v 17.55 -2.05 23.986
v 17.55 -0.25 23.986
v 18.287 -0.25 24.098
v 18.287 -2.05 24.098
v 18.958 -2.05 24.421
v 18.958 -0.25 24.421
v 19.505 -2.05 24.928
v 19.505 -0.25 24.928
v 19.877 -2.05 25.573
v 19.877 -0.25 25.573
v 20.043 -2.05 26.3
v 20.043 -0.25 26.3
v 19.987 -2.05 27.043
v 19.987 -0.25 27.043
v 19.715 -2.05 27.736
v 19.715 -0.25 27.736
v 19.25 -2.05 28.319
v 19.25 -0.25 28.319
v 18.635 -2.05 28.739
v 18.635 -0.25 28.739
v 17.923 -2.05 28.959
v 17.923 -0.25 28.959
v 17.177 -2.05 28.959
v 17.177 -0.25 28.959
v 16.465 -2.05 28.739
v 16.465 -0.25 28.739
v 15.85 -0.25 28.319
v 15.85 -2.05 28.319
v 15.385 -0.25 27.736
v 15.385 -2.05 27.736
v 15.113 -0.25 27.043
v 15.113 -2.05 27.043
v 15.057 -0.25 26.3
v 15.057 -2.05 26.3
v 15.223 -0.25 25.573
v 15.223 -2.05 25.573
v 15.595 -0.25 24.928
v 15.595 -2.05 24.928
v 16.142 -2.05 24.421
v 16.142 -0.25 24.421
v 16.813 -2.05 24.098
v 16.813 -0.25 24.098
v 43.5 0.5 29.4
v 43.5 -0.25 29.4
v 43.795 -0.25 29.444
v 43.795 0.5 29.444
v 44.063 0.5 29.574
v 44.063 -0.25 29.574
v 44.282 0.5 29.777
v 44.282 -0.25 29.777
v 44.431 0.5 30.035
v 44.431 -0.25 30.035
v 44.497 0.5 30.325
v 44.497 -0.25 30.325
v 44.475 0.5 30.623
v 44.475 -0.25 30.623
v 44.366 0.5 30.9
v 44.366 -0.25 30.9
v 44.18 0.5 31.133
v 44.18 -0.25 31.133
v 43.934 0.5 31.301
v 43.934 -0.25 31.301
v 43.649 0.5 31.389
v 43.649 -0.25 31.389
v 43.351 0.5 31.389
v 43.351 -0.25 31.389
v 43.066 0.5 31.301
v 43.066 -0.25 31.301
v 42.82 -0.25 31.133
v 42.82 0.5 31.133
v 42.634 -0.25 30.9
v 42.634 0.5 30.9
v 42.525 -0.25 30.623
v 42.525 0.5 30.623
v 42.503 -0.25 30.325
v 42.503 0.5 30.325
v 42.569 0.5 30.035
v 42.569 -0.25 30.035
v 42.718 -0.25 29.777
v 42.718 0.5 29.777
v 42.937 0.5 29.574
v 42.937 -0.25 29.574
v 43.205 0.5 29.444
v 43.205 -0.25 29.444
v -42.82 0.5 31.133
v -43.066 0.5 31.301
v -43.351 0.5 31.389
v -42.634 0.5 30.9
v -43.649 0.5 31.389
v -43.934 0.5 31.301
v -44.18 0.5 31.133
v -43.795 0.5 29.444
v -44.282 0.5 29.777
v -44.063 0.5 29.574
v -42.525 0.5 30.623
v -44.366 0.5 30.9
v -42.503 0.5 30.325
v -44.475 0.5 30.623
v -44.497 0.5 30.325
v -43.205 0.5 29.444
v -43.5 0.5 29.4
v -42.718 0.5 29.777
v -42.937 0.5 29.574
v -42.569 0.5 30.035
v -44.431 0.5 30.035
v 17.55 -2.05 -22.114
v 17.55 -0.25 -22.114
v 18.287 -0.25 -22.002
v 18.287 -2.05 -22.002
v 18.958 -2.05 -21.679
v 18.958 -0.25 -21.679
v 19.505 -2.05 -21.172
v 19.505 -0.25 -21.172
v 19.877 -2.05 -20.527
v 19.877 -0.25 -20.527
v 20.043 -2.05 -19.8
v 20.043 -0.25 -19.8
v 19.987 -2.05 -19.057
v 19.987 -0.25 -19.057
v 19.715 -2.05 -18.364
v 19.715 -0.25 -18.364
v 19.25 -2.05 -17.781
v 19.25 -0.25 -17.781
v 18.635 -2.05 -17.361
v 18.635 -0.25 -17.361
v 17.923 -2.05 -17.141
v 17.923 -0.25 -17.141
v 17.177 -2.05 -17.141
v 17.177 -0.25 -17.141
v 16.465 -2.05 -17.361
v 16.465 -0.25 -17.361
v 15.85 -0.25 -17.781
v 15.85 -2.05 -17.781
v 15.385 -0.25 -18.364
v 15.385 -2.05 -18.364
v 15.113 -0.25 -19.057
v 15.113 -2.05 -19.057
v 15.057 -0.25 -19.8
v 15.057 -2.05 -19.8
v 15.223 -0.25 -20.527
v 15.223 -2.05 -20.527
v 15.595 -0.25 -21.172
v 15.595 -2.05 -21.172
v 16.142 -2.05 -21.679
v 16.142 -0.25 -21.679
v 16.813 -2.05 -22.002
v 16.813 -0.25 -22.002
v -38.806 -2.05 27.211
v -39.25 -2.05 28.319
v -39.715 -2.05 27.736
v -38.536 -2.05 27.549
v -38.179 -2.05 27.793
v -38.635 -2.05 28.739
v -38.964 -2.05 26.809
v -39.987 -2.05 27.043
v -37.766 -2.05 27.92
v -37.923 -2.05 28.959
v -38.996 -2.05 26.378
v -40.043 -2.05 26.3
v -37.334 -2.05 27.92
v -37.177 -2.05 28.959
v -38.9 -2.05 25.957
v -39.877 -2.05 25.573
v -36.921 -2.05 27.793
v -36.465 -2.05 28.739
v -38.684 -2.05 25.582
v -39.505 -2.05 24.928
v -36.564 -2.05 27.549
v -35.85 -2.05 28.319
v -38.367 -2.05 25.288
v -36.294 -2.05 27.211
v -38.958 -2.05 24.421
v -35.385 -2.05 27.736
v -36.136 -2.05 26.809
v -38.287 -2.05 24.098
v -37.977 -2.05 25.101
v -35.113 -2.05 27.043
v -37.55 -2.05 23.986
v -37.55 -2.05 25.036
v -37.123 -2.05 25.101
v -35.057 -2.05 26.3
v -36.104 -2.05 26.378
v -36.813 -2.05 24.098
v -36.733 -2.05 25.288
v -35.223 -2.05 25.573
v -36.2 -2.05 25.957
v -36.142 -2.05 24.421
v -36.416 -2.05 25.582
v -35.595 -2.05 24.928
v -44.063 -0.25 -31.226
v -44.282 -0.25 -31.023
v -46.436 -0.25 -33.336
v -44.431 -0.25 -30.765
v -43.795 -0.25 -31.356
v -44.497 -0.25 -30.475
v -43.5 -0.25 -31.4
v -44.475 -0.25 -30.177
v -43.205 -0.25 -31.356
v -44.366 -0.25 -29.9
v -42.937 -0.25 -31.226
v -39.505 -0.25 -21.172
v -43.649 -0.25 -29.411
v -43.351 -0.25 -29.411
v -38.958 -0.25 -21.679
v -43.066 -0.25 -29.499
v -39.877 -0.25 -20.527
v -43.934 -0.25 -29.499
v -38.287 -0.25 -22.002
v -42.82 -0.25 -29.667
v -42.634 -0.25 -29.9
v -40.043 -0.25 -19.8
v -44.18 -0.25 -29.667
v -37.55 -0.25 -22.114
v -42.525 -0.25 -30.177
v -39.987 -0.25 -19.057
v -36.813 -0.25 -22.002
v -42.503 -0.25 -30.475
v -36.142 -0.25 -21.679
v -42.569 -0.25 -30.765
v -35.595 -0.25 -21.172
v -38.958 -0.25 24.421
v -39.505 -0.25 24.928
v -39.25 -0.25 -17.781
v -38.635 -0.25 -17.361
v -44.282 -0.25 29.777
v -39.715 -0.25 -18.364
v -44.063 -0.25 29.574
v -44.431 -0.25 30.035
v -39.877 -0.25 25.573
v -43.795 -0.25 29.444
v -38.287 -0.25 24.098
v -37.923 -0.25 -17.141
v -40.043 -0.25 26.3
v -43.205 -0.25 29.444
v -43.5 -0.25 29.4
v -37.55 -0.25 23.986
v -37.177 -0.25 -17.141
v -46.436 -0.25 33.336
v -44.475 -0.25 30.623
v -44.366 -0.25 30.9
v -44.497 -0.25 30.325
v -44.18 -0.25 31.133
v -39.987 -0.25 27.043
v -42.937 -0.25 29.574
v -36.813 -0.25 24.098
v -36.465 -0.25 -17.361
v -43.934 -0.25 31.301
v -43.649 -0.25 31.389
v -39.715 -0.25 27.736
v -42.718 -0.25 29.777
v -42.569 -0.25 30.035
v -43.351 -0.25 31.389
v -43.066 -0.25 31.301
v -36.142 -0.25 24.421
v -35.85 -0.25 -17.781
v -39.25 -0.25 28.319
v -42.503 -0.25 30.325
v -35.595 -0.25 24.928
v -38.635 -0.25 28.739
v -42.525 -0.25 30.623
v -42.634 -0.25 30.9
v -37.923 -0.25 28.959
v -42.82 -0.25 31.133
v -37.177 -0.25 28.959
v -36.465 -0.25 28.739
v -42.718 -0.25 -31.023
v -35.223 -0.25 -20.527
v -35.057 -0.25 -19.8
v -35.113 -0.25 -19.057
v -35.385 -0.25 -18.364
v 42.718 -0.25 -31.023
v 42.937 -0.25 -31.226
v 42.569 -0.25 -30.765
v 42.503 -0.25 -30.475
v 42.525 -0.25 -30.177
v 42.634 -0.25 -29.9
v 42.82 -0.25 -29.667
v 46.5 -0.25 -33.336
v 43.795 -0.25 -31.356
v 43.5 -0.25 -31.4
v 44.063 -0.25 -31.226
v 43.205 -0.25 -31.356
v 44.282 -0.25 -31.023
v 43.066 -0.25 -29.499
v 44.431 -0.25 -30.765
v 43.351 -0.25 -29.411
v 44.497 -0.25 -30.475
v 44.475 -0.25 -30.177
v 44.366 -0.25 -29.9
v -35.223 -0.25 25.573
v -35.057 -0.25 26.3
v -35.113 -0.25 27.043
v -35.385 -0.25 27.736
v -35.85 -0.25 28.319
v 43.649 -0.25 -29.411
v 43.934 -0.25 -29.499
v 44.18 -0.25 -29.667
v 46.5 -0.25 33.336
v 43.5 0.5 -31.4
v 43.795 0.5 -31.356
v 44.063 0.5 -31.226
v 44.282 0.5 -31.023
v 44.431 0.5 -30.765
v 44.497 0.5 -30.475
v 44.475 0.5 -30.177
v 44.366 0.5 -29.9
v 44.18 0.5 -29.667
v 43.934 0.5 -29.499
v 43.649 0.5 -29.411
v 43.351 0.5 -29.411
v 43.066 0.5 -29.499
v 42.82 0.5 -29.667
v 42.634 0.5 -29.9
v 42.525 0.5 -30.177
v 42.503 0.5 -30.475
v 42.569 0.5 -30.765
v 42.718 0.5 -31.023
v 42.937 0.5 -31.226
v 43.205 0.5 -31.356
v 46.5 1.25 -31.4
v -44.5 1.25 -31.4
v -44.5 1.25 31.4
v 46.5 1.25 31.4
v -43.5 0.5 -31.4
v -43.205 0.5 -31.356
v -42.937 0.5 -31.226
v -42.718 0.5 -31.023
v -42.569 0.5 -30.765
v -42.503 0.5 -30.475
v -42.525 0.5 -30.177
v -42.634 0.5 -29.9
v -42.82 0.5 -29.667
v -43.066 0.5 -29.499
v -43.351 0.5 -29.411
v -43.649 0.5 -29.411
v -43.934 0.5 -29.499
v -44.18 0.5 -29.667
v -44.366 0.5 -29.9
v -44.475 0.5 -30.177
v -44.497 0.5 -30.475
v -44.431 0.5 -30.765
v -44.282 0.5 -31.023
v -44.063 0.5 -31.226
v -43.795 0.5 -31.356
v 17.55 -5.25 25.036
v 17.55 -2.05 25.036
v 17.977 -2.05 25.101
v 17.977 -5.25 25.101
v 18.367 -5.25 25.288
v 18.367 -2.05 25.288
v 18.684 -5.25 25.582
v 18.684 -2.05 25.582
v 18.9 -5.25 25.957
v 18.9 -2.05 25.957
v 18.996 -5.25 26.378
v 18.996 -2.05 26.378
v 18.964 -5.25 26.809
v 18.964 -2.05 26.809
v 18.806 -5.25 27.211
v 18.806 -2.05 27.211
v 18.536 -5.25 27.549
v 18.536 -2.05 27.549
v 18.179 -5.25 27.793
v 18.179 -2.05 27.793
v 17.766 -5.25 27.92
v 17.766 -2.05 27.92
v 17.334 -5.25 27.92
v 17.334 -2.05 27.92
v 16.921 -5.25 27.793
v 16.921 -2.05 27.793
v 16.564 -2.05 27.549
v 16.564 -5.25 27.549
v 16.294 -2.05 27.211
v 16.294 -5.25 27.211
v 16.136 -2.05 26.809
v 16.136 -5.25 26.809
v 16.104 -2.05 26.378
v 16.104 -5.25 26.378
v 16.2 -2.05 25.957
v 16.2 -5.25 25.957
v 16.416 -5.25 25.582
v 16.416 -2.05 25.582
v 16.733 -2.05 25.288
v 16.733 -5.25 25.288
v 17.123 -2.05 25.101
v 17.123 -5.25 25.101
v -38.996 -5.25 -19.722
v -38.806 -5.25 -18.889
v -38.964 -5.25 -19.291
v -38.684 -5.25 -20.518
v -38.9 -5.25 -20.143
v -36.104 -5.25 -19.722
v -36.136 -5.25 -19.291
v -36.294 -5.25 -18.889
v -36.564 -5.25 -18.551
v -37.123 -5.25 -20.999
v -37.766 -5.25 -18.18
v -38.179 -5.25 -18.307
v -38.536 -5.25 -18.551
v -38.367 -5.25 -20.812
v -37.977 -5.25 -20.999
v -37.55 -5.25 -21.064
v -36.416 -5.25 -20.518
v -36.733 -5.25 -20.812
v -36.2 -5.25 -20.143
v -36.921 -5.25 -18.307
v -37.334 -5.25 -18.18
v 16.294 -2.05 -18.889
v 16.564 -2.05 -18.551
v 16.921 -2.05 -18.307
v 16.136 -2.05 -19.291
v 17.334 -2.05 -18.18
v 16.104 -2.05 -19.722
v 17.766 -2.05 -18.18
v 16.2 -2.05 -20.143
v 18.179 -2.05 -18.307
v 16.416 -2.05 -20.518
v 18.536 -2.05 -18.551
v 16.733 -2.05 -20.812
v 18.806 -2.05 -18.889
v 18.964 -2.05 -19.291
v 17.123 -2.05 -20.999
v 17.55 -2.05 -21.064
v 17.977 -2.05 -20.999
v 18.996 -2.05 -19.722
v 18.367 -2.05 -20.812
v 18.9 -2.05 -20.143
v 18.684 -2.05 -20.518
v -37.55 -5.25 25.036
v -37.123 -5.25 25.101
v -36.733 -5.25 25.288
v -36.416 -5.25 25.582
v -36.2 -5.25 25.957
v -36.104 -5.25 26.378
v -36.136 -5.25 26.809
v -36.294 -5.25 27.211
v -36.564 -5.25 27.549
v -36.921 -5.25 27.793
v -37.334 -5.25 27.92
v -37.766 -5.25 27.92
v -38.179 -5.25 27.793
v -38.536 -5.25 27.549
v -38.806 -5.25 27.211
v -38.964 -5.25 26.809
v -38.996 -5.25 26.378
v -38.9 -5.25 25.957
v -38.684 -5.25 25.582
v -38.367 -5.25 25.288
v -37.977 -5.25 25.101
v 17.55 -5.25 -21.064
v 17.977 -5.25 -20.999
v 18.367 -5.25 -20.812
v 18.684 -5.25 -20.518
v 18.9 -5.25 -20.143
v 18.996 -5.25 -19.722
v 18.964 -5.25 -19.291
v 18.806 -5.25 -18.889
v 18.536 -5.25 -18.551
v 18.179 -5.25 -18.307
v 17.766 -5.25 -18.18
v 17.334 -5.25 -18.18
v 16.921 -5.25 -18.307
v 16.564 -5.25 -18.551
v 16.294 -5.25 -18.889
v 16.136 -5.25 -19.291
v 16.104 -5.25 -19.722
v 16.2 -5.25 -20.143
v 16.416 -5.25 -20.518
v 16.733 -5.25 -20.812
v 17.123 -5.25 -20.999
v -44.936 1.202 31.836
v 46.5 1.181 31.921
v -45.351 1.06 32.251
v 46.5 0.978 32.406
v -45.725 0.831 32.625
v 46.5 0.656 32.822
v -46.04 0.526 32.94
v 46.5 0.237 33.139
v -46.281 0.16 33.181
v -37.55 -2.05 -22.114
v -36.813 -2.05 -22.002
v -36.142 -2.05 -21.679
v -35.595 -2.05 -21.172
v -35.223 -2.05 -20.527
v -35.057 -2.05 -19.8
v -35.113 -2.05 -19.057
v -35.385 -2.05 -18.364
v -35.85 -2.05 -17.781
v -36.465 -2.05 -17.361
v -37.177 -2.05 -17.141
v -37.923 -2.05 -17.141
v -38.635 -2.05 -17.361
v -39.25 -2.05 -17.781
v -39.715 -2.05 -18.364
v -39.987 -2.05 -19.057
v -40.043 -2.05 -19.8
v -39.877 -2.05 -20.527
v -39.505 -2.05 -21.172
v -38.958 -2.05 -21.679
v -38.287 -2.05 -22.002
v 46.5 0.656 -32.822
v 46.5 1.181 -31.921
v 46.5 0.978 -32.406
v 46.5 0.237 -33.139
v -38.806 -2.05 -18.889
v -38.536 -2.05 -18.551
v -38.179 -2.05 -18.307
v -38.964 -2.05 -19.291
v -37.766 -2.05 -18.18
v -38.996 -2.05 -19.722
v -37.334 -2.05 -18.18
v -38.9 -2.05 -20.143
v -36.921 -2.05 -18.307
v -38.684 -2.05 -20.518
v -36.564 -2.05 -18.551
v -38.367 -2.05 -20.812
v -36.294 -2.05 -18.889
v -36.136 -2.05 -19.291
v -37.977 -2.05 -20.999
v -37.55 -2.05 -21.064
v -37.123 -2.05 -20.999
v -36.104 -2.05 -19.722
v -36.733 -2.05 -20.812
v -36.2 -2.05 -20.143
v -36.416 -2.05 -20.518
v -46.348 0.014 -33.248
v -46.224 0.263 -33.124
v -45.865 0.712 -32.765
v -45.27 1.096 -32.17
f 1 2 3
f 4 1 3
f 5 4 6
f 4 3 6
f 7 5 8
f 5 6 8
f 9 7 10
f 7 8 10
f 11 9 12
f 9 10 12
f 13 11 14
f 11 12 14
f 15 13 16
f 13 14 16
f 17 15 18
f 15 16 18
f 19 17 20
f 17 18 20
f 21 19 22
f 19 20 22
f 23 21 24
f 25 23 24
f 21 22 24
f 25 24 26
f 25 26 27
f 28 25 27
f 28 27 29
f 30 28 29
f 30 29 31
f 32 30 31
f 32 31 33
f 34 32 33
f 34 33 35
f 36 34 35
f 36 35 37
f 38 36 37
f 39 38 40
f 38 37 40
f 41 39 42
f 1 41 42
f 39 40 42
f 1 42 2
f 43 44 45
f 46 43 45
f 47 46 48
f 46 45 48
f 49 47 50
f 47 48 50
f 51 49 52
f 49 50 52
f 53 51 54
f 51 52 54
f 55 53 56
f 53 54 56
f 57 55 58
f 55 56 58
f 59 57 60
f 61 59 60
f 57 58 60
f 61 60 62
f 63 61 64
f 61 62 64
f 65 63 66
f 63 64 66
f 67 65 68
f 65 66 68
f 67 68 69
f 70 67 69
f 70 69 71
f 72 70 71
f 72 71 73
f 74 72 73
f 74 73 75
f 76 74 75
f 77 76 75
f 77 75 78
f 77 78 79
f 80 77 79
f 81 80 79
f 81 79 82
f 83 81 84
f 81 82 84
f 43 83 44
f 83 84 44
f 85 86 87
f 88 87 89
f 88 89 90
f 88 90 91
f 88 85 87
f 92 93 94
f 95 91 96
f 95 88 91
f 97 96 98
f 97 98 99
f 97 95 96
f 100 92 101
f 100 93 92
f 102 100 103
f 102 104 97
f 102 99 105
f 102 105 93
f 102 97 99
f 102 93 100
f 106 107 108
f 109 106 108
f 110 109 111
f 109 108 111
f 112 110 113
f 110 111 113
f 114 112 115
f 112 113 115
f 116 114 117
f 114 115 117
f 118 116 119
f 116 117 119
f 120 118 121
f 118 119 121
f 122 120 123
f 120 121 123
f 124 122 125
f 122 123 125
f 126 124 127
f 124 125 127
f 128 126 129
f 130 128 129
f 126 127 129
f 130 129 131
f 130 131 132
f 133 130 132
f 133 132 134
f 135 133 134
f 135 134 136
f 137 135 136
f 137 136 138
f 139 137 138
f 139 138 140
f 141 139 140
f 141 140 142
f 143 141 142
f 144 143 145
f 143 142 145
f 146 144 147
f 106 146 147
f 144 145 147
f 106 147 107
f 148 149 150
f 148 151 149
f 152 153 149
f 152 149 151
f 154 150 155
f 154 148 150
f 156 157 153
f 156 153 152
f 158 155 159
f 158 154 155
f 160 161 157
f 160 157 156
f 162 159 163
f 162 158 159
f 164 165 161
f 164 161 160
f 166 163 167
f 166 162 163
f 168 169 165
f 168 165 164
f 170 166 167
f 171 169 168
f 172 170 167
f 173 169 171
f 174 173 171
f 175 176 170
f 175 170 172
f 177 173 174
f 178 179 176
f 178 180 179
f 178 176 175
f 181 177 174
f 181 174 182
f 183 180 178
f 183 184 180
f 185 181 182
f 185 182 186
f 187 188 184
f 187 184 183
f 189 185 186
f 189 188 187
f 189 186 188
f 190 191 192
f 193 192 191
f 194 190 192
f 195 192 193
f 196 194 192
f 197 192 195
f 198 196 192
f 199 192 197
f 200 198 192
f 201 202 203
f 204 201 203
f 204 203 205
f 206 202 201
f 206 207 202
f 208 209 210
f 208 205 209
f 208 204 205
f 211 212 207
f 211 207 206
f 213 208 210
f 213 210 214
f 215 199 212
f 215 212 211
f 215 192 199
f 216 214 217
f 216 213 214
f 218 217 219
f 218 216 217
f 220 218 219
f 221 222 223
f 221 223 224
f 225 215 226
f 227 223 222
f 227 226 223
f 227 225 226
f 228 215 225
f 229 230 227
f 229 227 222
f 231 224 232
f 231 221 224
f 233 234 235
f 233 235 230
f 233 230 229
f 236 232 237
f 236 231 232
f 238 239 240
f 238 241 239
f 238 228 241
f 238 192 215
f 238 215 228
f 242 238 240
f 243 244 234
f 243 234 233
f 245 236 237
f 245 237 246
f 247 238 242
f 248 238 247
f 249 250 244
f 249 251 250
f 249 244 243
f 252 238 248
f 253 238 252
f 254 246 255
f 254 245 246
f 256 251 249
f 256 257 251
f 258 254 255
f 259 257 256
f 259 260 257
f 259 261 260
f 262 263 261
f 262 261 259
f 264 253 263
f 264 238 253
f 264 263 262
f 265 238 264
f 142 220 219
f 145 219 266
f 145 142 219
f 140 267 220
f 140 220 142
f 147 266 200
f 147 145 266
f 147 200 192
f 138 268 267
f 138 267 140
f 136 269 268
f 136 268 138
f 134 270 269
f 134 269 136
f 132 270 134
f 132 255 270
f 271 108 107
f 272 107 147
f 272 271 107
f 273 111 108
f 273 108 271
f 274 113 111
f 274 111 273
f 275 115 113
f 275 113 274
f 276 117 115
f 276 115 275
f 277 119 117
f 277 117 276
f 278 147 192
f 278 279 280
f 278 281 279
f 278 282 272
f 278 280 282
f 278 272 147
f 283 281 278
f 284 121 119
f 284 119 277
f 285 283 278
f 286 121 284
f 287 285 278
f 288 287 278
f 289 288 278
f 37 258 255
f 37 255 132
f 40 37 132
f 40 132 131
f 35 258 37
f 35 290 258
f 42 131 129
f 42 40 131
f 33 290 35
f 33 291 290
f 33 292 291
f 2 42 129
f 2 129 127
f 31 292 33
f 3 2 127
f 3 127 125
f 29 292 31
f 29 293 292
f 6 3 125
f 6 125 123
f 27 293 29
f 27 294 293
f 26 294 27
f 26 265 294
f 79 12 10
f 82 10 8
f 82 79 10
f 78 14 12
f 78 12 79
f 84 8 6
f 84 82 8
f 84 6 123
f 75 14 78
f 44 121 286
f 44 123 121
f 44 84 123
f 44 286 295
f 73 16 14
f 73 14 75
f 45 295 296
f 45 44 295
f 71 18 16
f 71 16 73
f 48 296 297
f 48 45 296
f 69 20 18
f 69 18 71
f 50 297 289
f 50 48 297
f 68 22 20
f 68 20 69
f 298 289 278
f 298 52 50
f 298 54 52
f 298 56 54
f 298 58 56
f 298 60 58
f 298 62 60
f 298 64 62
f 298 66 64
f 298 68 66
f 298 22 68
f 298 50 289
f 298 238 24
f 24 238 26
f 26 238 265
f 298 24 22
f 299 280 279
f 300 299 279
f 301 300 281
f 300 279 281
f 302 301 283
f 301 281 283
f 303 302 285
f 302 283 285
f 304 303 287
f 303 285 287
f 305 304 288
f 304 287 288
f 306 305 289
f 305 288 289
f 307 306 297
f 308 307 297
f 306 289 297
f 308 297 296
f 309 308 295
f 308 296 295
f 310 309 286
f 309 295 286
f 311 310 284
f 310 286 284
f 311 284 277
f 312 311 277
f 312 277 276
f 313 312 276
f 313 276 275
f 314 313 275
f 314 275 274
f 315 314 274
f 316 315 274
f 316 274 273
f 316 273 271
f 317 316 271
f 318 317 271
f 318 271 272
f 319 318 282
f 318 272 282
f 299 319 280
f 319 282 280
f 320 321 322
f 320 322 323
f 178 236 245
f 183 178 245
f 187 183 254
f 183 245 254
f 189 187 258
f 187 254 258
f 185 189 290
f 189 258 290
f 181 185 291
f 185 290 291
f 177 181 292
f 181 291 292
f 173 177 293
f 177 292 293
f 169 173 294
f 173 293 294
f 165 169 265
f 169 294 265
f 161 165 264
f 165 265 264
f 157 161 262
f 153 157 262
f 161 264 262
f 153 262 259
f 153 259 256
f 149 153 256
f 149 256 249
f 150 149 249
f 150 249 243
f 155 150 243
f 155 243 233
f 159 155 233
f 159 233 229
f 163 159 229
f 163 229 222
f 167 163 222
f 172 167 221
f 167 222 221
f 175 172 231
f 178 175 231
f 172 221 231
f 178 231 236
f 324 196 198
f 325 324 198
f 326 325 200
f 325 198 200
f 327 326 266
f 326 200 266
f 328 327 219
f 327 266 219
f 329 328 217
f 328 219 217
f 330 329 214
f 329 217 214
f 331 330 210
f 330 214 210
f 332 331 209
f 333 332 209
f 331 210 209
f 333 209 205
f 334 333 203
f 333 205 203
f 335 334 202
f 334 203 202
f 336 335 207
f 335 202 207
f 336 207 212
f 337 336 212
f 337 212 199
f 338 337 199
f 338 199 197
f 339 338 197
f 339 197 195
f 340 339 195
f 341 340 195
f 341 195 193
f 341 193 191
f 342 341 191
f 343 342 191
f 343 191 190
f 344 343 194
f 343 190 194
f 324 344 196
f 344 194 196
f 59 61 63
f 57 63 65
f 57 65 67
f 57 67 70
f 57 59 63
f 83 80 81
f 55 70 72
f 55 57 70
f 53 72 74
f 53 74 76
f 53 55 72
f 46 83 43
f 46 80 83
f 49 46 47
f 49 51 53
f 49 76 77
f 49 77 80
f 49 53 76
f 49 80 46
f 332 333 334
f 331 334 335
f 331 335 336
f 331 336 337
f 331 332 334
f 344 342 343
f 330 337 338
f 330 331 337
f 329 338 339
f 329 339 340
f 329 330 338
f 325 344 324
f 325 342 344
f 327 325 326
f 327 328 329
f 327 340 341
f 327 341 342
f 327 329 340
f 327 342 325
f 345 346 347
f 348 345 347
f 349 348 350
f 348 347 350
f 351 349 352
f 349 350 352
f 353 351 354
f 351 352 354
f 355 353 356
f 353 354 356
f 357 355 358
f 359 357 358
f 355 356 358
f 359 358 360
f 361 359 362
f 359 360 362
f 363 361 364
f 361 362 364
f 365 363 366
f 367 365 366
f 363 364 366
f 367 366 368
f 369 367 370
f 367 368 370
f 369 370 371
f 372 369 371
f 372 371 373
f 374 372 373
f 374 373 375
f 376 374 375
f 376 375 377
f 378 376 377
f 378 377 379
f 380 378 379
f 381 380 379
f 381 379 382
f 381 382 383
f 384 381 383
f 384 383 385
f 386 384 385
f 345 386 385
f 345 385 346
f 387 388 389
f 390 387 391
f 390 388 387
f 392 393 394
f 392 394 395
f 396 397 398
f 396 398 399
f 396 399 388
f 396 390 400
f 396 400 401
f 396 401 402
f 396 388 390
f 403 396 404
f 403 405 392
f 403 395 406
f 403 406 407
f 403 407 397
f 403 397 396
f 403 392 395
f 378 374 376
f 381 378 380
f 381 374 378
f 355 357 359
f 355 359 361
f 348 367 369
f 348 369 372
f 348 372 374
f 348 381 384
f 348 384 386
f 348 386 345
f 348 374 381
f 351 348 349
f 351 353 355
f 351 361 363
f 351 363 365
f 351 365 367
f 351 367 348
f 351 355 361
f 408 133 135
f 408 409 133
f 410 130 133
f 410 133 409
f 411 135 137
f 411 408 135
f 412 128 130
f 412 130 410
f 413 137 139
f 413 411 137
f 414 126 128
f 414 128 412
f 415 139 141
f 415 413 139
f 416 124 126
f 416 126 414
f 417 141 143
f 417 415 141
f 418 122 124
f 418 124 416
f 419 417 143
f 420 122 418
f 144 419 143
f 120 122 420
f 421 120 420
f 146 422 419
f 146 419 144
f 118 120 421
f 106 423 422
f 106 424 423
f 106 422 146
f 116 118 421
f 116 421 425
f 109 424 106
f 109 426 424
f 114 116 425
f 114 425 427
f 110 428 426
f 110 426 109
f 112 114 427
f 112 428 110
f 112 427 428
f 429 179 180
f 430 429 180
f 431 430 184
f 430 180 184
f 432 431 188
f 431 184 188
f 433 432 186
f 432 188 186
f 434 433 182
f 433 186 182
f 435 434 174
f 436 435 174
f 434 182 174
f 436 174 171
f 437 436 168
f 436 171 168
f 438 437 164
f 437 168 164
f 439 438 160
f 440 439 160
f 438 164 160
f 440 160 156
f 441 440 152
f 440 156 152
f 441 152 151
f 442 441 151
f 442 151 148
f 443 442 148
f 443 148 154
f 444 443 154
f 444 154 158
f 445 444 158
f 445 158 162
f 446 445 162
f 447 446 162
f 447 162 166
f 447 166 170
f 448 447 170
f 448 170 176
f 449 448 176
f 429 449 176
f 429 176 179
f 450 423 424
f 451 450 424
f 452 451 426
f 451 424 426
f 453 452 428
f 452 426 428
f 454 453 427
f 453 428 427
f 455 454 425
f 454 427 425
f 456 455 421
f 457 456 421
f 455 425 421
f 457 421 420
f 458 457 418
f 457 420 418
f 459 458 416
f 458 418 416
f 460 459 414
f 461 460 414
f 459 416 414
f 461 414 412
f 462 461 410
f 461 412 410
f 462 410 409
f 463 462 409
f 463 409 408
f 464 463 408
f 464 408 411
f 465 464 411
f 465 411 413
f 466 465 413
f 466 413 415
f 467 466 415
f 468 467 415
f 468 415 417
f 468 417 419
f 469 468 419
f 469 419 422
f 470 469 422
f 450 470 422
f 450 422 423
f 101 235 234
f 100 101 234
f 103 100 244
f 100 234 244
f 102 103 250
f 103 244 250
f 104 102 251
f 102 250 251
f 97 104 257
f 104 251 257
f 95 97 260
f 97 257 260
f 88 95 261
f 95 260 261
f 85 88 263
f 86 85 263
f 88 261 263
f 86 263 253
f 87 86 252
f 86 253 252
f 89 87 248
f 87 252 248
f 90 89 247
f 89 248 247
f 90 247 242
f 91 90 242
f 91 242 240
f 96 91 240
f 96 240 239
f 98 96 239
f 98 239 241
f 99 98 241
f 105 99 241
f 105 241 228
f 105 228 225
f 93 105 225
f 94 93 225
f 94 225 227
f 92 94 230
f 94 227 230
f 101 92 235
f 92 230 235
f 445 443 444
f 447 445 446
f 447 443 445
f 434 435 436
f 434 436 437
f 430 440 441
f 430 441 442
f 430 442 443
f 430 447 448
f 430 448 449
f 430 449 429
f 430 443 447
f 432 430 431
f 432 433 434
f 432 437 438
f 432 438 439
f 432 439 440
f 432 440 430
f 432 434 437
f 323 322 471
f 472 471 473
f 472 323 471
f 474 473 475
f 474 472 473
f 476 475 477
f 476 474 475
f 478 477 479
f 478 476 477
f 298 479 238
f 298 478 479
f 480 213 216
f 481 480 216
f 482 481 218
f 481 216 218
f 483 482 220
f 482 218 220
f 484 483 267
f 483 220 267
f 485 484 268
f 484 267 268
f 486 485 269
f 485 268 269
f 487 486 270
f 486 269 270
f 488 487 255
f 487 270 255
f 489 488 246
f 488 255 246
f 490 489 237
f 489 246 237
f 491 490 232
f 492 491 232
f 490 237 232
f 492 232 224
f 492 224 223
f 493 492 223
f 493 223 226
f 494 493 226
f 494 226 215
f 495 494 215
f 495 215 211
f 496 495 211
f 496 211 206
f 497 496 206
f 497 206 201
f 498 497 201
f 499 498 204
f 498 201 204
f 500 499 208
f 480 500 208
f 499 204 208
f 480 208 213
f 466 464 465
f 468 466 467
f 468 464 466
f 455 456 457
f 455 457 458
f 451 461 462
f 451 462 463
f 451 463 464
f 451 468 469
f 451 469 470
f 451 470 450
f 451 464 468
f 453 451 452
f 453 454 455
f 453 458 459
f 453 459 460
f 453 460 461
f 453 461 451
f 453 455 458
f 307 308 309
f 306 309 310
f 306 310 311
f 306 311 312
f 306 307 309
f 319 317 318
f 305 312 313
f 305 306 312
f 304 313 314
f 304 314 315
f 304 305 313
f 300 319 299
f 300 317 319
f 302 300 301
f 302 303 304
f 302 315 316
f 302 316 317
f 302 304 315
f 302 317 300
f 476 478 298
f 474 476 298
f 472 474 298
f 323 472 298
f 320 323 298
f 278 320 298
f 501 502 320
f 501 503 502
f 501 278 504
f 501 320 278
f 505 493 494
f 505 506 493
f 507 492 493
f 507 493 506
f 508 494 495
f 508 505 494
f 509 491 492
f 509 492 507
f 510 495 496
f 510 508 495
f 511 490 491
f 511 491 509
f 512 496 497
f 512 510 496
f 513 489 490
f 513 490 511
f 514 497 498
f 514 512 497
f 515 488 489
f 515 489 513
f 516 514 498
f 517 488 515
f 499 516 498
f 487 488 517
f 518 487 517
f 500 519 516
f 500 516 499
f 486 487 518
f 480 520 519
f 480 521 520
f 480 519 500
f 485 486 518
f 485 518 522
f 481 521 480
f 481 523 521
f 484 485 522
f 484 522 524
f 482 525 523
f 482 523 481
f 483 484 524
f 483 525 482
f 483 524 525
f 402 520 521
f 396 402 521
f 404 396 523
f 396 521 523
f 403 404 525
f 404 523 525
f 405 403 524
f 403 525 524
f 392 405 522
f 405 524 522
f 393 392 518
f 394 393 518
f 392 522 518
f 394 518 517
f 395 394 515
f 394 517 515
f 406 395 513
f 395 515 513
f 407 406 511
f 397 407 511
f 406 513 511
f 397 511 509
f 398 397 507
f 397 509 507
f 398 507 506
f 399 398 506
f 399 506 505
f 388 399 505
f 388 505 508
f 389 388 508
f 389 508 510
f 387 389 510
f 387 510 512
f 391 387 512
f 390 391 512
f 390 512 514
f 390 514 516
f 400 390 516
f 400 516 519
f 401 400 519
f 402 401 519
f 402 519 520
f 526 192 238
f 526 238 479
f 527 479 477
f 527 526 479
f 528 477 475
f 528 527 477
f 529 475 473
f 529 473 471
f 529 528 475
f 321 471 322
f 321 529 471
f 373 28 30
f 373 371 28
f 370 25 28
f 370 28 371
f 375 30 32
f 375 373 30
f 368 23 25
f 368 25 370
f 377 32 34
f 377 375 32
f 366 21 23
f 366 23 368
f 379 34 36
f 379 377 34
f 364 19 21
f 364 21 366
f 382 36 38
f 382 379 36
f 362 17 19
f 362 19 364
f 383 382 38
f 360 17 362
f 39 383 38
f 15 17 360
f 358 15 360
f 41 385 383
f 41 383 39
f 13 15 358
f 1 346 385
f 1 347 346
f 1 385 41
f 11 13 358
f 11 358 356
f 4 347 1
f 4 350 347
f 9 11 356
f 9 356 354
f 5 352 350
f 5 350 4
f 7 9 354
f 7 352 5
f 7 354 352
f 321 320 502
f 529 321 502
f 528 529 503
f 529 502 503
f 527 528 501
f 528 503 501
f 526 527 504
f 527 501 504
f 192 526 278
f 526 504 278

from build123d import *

# Parameters (mm, degrees)
SKETCH1_W           = 93
SKETCH1_H           = 66.8
BOSS_EXTRUDE1_DEPTH = 1.25
FILLET1_R           = 2
SKETCH2_W           = 93
SKETCH2_H           = 66.8
CUT_EXTRUDE1_DEPTH  = 1
SKETCH3_R           = 1
CUT_EXTRUDE2_DEPTH  = 0.75
SKETCH4_R           = 1.45
BOSS_EXTRUDE2_DEPTH = 5
SKETCH5_R           = 2.5
BOSS_EXTRUDE3_DEPTH = 1.8


with BuildPart() as part:
    # Sketch1 → Boss-Extrude1 (new, symmetric)
    with BuildSketch(Plane(origin=(0, 0, 0), x_dir=(1, 0, 0), z_dir=(0, 1, 0))):
        Rectangle(SKETCH1_W, SKETCH1_H)
    extrude(amount=BOSS_EXTRUDE1_DEPTH, both=True)

    # Fillet1
    fillet1_edges = [part.edges().sort_by_distance(p)[0] for p in [
        (0, 1.25, -33.4),
        (-46.5, 1.25, 0),
        (0, 1.25, 33.4),
    ]]
    fillet(fillet1_edges, radius=FILLET1_R)

    # Sketch2 → Cut-Extrude1 (cut)
    with BuildSketch(Plane.XZ.offset(1.25)):
        Rectangle(SKETCH2_W, SKETCH2_H)
    extrude(amount=-CUT_EXTRUDE1_DEPTH, mode=Mode.SUBTRACT)

    # Sketch3 → Cut-Extrude2 (cut)
    with BuildSketch(Plane.XZ.offset(0.25)):
        with Locations(Location((-43.5, 30.4, 0), (0, 0, 270))):
            Circle(SKETCH3_R)
        with Locations(Location((43.5, 30.4, 0), (0, 0, 270))):
            Circle(SKETCH3_R)
        with Locations(Location((43.5, -30.4, 0), (0, 0, 270))):
            Circle(SKETCH3_R)
        with Locations(Location((-43.5, -30.4, 0), (0, 0, 270))):
            Circle(SKETCH3_R)
    extrude(amount=-CUT_EXTRUDE2_DEPTH, mode=Mode.SUBTRACT)

    # Sketch4 → Boss-Extrude2 (add)
    with BuildSketch(Plane.XZ.offset(0.25)):
        with Locations(Location((-37.55, 26.486491673, 0), (0, 0, 270))):
            Circle(SKETCH4_R)
        with Locations(Location((17.55, 26.486491673, 0), (0, 0, 270))):
            Circle(SKETCH4_R)
        with Locations(Location((17.55, -19.613508327, 0), (0, 0, 270))):
            Circle(SKETCH4_R)
        with Locations(Location((-37.55, -19.613508327, 0), (0, 0, 270))):
            Circle(SKETCH4_R)
    extrude(amount=BOSS_EXTRUDE2_DEPTH)

    # Sketch5 → Boss-Extrude3 (add)
    with BuildSketch(Plane.XZ.offset(0.25)):
        with Locations(Location((-37.55, 26.486491673, 0), (0, 0, 270))):
            Circle(SKETCH5_R)
        with Locations(Location((17.55, 26.486491673, 0), (0, 0, 270))):
            Circle(SKETCH5_R)
        with Locations(Location((17.55, -19.613508327, 0), (0, 0, 270))):
            Circle(SKETCH5_R)
        with Locations(Location((-37.55, -19.613508327, 0), (0, 0, 270))):
            Circle(SKETCH5_R)
    extrude(amount=BOSS_EXTRUDE3_DEPTH)


solid = part.part
